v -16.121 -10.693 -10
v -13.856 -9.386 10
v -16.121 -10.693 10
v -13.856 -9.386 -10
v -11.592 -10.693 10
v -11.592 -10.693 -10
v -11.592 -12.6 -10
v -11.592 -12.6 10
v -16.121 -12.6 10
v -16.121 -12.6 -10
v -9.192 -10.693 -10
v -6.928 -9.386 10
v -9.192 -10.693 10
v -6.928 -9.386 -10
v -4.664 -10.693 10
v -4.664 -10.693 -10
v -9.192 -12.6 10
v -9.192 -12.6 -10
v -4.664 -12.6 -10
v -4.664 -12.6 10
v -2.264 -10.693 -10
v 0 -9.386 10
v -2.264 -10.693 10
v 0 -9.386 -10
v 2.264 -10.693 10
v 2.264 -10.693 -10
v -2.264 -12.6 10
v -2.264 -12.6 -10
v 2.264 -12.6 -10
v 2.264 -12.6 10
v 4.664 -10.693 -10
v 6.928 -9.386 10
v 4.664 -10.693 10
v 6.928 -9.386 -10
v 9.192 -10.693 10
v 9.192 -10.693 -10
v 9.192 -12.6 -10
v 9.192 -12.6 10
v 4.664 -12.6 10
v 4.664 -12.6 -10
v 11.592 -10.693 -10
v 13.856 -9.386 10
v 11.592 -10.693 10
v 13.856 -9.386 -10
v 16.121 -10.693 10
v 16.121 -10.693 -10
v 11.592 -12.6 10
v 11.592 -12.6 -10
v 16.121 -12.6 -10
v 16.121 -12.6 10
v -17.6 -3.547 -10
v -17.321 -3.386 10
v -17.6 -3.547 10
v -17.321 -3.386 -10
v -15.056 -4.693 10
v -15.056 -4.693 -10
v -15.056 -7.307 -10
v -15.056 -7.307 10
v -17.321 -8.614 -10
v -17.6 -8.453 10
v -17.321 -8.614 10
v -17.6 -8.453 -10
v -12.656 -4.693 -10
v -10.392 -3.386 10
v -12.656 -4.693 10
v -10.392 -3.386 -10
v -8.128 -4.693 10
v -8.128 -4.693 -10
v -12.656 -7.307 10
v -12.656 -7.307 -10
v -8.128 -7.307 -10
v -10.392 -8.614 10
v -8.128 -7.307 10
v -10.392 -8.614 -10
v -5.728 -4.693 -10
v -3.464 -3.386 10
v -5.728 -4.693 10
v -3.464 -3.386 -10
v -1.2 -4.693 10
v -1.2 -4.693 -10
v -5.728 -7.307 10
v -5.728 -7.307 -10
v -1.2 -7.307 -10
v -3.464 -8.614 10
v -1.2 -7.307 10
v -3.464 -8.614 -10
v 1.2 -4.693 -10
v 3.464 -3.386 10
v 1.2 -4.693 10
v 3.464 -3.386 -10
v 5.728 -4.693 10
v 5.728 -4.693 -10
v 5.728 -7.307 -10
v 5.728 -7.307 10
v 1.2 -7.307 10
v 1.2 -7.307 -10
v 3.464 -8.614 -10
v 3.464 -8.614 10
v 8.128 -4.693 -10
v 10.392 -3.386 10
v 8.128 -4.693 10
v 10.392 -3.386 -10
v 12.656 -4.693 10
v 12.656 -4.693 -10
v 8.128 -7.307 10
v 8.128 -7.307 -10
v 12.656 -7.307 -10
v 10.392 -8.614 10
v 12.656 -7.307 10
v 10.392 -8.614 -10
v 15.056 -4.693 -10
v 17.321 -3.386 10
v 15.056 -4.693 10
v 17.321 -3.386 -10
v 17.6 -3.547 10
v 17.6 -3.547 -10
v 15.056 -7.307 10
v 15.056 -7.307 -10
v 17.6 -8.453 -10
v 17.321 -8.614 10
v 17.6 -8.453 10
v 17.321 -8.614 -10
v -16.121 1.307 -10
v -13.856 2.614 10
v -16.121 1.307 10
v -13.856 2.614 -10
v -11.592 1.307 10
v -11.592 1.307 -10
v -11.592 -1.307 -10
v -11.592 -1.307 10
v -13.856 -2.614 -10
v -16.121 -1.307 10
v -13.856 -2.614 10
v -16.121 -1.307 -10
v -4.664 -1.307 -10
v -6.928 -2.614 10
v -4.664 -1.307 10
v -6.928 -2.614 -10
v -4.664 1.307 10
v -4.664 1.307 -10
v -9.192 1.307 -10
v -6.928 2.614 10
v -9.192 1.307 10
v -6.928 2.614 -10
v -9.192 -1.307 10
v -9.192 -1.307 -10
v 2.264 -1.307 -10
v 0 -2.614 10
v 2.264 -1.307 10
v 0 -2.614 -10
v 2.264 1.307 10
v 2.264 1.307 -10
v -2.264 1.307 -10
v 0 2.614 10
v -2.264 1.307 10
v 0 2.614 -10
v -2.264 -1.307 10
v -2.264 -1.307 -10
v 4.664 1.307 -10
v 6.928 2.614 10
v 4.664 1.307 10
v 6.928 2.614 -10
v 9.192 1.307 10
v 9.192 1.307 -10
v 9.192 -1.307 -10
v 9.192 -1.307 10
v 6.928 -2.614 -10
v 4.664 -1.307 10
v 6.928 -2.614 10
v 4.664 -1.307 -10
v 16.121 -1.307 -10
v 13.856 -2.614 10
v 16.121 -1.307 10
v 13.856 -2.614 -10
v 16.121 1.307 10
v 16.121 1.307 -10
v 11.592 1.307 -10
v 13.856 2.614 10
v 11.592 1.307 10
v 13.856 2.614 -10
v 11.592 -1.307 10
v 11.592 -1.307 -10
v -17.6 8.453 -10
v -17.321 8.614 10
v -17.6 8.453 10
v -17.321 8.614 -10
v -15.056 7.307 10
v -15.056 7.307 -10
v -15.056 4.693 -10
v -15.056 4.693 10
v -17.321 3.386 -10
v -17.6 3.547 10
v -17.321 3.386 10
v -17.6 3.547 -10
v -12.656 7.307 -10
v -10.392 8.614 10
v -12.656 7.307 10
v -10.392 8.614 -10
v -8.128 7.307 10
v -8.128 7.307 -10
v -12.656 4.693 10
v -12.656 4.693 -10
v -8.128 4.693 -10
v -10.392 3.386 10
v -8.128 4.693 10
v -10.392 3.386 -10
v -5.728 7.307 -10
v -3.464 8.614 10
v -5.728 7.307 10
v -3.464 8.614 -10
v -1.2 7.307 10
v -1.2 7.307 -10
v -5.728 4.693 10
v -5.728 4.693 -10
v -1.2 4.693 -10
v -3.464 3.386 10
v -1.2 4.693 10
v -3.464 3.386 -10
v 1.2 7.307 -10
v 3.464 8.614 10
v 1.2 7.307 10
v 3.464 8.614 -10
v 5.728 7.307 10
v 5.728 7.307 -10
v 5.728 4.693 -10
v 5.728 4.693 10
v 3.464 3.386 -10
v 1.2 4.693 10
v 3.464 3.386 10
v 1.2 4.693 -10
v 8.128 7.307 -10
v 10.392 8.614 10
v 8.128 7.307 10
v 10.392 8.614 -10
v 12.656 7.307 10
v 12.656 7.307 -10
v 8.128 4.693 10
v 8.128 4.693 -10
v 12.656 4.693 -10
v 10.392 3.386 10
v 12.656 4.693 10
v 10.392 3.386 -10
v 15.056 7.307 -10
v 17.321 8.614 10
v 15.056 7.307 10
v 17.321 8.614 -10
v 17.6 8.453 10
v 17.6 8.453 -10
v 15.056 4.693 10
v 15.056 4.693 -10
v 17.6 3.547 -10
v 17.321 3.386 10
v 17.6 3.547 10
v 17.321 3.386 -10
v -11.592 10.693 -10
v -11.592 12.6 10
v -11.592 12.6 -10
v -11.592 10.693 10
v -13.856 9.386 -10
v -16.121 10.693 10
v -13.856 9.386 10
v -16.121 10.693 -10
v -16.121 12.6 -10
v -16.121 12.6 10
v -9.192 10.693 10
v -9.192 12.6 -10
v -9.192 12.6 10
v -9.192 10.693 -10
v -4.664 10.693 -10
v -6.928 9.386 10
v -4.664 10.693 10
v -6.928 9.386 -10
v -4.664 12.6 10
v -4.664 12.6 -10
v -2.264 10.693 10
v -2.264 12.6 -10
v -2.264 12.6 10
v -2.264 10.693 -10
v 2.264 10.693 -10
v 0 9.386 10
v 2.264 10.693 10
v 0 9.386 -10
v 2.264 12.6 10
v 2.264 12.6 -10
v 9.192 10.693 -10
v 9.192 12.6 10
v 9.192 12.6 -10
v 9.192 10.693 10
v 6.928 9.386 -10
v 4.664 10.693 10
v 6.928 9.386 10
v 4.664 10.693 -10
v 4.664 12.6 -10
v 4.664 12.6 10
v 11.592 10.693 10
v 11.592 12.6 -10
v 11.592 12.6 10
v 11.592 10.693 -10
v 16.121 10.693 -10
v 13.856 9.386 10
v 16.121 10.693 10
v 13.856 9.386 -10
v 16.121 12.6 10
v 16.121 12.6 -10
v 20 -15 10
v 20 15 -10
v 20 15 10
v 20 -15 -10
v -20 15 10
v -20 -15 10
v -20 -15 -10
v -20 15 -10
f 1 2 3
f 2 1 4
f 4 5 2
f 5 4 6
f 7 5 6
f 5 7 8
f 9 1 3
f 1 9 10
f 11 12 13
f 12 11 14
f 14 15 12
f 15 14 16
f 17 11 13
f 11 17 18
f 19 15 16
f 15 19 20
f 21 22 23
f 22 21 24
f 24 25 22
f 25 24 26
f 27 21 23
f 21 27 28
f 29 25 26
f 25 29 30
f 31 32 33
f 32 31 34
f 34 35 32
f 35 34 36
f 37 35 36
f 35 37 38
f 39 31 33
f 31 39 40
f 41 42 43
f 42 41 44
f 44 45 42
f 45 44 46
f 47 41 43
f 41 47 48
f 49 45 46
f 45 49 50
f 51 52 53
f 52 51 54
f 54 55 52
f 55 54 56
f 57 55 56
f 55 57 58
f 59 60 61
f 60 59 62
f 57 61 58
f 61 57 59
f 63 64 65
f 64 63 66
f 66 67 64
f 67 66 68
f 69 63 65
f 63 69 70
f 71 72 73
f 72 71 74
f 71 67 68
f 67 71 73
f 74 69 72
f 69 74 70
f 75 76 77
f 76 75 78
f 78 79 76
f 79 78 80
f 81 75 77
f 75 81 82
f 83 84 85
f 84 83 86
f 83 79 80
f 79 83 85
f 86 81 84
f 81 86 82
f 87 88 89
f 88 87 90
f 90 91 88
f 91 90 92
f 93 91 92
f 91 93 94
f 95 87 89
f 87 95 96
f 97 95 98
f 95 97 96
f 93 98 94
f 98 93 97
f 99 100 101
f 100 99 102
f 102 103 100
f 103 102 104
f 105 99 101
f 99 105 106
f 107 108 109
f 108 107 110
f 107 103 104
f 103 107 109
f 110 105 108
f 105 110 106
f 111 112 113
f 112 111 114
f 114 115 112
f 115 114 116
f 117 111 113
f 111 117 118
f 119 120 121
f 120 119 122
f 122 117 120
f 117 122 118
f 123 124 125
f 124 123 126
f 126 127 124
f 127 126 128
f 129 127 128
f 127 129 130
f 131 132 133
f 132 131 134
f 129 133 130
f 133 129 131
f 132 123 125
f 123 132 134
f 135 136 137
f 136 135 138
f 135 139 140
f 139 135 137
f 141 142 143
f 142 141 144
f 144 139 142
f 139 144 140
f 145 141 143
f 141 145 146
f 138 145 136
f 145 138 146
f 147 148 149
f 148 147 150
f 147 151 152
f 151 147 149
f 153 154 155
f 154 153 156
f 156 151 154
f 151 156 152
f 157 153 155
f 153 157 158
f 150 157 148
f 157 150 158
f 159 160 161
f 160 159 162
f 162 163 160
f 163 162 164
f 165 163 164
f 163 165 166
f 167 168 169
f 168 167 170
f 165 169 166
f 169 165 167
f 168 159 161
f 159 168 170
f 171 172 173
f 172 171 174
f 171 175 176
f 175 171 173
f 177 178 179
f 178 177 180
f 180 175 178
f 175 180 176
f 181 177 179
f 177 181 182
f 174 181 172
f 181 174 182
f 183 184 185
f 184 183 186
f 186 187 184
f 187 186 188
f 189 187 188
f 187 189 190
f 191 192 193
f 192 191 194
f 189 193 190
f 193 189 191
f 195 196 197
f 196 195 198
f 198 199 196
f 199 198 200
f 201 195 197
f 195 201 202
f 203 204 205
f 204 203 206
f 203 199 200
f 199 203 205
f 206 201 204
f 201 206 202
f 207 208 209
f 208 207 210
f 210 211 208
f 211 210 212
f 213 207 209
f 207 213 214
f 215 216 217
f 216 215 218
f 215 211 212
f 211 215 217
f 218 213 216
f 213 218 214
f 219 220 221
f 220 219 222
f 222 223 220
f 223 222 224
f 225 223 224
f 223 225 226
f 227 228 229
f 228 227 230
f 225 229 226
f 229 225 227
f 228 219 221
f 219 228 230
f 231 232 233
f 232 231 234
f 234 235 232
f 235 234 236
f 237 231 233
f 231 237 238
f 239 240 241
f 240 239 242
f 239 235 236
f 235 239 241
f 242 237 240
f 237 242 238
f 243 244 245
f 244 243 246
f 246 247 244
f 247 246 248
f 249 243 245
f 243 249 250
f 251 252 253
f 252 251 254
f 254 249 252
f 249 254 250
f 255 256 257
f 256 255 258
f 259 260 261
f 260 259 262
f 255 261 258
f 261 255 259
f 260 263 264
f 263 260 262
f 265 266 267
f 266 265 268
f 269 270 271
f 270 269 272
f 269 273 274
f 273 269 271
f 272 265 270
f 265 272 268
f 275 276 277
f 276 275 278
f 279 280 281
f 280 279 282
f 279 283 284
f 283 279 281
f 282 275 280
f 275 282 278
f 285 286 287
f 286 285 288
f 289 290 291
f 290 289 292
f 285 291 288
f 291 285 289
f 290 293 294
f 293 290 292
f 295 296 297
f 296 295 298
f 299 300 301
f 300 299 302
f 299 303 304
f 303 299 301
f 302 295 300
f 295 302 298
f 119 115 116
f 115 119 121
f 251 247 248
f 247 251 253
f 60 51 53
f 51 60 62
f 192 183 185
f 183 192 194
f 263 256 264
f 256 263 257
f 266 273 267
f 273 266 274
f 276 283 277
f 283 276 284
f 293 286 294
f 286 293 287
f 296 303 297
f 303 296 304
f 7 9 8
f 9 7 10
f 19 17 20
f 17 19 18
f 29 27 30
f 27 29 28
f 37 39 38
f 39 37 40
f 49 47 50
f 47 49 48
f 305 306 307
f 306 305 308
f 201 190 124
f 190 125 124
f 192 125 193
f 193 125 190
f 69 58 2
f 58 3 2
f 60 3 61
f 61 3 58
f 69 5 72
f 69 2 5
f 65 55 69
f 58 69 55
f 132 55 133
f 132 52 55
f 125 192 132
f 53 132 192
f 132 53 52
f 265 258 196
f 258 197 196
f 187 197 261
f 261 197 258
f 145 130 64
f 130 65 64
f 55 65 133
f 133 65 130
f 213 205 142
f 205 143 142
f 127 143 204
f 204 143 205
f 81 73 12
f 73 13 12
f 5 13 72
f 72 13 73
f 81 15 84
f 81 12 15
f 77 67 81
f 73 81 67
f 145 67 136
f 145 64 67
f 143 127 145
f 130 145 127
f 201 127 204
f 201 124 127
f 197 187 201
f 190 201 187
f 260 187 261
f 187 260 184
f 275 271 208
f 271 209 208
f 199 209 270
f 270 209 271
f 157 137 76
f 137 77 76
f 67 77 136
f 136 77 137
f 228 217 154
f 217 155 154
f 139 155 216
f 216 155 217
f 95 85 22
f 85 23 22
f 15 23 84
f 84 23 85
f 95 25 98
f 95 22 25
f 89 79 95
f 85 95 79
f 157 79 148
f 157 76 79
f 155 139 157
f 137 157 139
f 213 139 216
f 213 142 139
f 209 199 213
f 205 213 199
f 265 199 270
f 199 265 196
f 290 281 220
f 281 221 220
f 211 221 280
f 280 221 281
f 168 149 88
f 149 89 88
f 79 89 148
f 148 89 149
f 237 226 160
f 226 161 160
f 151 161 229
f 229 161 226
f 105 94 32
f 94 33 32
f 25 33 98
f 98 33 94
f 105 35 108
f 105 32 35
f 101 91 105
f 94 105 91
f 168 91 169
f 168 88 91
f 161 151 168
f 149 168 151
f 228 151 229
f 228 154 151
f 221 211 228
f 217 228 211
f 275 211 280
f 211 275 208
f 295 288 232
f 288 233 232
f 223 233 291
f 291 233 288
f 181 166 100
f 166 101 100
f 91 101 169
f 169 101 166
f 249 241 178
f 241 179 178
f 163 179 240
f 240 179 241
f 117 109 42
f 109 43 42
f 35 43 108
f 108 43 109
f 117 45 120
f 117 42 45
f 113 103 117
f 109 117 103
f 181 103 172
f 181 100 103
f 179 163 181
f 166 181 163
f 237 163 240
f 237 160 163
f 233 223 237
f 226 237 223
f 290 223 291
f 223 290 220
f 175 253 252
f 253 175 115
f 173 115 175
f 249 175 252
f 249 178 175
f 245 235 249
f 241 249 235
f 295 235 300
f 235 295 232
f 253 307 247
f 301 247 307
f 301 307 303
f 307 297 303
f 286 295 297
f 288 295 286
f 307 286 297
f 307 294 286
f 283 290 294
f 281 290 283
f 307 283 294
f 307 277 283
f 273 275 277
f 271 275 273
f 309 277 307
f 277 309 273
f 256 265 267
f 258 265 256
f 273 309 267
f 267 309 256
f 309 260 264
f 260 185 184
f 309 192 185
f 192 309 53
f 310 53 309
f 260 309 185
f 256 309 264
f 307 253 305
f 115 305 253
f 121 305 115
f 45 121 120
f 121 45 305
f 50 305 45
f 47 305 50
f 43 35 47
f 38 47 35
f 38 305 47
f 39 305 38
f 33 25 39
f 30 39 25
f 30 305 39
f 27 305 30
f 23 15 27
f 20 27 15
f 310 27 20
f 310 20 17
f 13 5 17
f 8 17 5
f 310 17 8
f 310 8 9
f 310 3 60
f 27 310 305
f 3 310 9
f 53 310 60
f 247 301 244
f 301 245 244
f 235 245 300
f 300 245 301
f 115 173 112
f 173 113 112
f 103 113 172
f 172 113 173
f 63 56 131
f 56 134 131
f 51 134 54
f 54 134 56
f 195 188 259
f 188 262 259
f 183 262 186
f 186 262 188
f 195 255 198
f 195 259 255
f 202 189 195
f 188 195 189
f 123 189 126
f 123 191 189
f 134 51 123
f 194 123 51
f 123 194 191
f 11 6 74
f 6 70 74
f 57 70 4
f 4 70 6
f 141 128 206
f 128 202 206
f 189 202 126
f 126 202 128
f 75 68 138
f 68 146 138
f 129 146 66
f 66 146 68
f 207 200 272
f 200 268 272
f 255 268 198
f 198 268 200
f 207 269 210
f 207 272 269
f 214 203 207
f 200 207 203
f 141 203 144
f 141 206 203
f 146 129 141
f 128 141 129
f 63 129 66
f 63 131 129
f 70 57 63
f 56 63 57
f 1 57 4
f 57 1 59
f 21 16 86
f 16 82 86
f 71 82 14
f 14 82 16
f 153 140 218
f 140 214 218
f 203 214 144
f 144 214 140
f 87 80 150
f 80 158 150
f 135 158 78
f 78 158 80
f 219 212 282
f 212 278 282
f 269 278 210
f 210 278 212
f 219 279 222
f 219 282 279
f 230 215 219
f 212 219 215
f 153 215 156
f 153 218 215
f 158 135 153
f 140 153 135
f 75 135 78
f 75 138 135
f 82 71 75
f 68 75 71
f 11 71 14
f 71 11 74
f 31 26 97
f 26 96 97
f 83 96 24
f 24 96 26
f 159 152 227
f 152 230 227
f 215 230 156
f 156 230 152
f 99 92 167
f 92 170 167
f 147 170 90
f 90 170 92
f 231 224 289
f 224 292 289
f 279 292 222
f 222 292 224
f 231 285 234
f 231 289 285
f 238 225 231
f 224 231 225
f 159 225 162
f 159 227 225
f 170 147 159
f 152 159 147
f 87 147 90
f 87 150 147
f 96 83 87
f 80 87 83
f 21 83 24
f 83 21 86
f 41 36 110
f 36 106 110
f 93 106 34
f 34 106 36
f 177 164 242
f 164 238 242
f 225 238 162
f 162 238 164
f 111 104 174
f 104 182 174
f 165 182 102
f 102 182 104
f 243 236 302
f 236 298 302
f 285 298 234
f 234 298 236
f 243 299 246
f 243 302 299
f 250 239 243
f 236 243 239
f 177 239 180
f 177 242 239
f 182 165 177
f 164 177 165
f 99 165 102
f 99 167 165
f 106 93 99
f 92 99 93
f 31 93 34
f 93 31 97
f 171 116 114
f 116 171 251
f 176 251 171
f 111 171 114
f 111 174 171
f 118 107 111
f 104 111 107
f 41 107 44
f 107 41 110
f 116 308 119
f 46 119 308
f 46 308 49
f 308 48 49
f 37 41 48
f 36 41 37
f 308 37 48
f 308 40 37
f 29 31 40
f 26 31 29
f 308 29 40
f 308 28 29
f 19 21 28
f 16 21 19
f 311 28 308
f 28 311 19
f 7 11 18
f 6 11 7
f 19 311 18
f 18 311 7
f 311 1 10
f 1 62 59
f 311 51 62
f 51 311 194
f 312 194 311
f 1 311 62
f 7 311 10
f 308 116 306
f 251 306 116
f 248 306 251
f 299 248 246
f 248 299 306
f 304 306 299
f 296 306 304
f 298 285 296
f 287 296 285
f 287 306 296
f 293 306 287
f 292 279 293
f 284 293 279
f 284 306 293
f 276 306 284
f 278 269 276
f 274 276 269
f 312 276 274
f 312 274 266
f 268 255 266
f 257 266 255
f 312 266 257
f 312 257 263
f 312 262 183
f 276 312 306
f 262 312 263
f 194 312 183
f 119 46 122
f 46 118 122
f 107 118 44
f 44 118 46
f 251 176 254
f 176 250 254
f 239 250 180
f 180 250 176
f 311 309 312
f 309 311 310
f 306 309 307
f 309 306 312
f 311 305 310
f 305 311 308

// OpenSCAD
// file: ../scad_reference/oobb_cube_hexagon_cutout_raw.scad
module oobb_cube_hexagon_cutout_raw(sx=100, sy=100, sz=10, cut_sx=100, cut_sy=100, cut_sz=10, hex_r=10, border=10, rot_cut=[0, 0, 0]) {
    // Flat-top hexagon tiling:
    //   col_step = hex_r * sqrt(3)   (horizontal centre-to-centre, same row)
    //   row_step = hex_r * 1.5       (vertical   centre-to-centre)
    //   odd rows are offset by col_step/2
    // Shrink the cutout hexagons relative to the lattice pitch so the
    // requested border width also appears between neighbouring cutouts.
    col_step = hex_r * sqrt(3);
    row_step = hex_r * 1.5;
    hex_cut_r = max(hex_r - border / sqrt(3), 0.01);
    usable_x = cut_sx - border * 2;
    usable_y = cut_sy - border * 2;
    cols = ceil(usable_x / col_step) + 2;
    rows = ceil(usable_y / row_step) + 2;

    // Outer cube minus only the hex-hole portion of the inner workspace.
    difference() {
        cube([sx, sy, sz], center=true);
        rotate(rot_cut)
            intersection() {
                // Inner cube clips the cutout region to keep the edge border.
                cube([usable_x, usable_y, cut_sz + 2], center=true);
                // Hex lattice clipped by the inner cube becomes the subtraction volume.
                for (row = [-rows : rows]) {
                    for (col = [-cols : cols]) {
                        x_off = (row % 2 == 0) ? 0 : col_step / 2;
                        translate([col * col_step + x_off, row * row_step, 0])
                            rotate([0, 0, 30])
                                cylinder(r=hex_cut_r, h=cut_sz + 4, center=true, $fn=6);
                    }
                }
            }
    }
}
// main file
$fn = 50;

use <../scad_reference/oobb_cube_hexagon_cutout_raw.scad>;

difference() {
	union() {
		oobb_cube_hexagon_cutout_raw(border = 2.4, cut_sx = 40.0, cut_sy = 30.0, cut_sz = 20.0, hex_r = 4, rot_cut = [0, 0, 0], sx = 40, sy = 30, sz = 20);
	}
	union();
}
